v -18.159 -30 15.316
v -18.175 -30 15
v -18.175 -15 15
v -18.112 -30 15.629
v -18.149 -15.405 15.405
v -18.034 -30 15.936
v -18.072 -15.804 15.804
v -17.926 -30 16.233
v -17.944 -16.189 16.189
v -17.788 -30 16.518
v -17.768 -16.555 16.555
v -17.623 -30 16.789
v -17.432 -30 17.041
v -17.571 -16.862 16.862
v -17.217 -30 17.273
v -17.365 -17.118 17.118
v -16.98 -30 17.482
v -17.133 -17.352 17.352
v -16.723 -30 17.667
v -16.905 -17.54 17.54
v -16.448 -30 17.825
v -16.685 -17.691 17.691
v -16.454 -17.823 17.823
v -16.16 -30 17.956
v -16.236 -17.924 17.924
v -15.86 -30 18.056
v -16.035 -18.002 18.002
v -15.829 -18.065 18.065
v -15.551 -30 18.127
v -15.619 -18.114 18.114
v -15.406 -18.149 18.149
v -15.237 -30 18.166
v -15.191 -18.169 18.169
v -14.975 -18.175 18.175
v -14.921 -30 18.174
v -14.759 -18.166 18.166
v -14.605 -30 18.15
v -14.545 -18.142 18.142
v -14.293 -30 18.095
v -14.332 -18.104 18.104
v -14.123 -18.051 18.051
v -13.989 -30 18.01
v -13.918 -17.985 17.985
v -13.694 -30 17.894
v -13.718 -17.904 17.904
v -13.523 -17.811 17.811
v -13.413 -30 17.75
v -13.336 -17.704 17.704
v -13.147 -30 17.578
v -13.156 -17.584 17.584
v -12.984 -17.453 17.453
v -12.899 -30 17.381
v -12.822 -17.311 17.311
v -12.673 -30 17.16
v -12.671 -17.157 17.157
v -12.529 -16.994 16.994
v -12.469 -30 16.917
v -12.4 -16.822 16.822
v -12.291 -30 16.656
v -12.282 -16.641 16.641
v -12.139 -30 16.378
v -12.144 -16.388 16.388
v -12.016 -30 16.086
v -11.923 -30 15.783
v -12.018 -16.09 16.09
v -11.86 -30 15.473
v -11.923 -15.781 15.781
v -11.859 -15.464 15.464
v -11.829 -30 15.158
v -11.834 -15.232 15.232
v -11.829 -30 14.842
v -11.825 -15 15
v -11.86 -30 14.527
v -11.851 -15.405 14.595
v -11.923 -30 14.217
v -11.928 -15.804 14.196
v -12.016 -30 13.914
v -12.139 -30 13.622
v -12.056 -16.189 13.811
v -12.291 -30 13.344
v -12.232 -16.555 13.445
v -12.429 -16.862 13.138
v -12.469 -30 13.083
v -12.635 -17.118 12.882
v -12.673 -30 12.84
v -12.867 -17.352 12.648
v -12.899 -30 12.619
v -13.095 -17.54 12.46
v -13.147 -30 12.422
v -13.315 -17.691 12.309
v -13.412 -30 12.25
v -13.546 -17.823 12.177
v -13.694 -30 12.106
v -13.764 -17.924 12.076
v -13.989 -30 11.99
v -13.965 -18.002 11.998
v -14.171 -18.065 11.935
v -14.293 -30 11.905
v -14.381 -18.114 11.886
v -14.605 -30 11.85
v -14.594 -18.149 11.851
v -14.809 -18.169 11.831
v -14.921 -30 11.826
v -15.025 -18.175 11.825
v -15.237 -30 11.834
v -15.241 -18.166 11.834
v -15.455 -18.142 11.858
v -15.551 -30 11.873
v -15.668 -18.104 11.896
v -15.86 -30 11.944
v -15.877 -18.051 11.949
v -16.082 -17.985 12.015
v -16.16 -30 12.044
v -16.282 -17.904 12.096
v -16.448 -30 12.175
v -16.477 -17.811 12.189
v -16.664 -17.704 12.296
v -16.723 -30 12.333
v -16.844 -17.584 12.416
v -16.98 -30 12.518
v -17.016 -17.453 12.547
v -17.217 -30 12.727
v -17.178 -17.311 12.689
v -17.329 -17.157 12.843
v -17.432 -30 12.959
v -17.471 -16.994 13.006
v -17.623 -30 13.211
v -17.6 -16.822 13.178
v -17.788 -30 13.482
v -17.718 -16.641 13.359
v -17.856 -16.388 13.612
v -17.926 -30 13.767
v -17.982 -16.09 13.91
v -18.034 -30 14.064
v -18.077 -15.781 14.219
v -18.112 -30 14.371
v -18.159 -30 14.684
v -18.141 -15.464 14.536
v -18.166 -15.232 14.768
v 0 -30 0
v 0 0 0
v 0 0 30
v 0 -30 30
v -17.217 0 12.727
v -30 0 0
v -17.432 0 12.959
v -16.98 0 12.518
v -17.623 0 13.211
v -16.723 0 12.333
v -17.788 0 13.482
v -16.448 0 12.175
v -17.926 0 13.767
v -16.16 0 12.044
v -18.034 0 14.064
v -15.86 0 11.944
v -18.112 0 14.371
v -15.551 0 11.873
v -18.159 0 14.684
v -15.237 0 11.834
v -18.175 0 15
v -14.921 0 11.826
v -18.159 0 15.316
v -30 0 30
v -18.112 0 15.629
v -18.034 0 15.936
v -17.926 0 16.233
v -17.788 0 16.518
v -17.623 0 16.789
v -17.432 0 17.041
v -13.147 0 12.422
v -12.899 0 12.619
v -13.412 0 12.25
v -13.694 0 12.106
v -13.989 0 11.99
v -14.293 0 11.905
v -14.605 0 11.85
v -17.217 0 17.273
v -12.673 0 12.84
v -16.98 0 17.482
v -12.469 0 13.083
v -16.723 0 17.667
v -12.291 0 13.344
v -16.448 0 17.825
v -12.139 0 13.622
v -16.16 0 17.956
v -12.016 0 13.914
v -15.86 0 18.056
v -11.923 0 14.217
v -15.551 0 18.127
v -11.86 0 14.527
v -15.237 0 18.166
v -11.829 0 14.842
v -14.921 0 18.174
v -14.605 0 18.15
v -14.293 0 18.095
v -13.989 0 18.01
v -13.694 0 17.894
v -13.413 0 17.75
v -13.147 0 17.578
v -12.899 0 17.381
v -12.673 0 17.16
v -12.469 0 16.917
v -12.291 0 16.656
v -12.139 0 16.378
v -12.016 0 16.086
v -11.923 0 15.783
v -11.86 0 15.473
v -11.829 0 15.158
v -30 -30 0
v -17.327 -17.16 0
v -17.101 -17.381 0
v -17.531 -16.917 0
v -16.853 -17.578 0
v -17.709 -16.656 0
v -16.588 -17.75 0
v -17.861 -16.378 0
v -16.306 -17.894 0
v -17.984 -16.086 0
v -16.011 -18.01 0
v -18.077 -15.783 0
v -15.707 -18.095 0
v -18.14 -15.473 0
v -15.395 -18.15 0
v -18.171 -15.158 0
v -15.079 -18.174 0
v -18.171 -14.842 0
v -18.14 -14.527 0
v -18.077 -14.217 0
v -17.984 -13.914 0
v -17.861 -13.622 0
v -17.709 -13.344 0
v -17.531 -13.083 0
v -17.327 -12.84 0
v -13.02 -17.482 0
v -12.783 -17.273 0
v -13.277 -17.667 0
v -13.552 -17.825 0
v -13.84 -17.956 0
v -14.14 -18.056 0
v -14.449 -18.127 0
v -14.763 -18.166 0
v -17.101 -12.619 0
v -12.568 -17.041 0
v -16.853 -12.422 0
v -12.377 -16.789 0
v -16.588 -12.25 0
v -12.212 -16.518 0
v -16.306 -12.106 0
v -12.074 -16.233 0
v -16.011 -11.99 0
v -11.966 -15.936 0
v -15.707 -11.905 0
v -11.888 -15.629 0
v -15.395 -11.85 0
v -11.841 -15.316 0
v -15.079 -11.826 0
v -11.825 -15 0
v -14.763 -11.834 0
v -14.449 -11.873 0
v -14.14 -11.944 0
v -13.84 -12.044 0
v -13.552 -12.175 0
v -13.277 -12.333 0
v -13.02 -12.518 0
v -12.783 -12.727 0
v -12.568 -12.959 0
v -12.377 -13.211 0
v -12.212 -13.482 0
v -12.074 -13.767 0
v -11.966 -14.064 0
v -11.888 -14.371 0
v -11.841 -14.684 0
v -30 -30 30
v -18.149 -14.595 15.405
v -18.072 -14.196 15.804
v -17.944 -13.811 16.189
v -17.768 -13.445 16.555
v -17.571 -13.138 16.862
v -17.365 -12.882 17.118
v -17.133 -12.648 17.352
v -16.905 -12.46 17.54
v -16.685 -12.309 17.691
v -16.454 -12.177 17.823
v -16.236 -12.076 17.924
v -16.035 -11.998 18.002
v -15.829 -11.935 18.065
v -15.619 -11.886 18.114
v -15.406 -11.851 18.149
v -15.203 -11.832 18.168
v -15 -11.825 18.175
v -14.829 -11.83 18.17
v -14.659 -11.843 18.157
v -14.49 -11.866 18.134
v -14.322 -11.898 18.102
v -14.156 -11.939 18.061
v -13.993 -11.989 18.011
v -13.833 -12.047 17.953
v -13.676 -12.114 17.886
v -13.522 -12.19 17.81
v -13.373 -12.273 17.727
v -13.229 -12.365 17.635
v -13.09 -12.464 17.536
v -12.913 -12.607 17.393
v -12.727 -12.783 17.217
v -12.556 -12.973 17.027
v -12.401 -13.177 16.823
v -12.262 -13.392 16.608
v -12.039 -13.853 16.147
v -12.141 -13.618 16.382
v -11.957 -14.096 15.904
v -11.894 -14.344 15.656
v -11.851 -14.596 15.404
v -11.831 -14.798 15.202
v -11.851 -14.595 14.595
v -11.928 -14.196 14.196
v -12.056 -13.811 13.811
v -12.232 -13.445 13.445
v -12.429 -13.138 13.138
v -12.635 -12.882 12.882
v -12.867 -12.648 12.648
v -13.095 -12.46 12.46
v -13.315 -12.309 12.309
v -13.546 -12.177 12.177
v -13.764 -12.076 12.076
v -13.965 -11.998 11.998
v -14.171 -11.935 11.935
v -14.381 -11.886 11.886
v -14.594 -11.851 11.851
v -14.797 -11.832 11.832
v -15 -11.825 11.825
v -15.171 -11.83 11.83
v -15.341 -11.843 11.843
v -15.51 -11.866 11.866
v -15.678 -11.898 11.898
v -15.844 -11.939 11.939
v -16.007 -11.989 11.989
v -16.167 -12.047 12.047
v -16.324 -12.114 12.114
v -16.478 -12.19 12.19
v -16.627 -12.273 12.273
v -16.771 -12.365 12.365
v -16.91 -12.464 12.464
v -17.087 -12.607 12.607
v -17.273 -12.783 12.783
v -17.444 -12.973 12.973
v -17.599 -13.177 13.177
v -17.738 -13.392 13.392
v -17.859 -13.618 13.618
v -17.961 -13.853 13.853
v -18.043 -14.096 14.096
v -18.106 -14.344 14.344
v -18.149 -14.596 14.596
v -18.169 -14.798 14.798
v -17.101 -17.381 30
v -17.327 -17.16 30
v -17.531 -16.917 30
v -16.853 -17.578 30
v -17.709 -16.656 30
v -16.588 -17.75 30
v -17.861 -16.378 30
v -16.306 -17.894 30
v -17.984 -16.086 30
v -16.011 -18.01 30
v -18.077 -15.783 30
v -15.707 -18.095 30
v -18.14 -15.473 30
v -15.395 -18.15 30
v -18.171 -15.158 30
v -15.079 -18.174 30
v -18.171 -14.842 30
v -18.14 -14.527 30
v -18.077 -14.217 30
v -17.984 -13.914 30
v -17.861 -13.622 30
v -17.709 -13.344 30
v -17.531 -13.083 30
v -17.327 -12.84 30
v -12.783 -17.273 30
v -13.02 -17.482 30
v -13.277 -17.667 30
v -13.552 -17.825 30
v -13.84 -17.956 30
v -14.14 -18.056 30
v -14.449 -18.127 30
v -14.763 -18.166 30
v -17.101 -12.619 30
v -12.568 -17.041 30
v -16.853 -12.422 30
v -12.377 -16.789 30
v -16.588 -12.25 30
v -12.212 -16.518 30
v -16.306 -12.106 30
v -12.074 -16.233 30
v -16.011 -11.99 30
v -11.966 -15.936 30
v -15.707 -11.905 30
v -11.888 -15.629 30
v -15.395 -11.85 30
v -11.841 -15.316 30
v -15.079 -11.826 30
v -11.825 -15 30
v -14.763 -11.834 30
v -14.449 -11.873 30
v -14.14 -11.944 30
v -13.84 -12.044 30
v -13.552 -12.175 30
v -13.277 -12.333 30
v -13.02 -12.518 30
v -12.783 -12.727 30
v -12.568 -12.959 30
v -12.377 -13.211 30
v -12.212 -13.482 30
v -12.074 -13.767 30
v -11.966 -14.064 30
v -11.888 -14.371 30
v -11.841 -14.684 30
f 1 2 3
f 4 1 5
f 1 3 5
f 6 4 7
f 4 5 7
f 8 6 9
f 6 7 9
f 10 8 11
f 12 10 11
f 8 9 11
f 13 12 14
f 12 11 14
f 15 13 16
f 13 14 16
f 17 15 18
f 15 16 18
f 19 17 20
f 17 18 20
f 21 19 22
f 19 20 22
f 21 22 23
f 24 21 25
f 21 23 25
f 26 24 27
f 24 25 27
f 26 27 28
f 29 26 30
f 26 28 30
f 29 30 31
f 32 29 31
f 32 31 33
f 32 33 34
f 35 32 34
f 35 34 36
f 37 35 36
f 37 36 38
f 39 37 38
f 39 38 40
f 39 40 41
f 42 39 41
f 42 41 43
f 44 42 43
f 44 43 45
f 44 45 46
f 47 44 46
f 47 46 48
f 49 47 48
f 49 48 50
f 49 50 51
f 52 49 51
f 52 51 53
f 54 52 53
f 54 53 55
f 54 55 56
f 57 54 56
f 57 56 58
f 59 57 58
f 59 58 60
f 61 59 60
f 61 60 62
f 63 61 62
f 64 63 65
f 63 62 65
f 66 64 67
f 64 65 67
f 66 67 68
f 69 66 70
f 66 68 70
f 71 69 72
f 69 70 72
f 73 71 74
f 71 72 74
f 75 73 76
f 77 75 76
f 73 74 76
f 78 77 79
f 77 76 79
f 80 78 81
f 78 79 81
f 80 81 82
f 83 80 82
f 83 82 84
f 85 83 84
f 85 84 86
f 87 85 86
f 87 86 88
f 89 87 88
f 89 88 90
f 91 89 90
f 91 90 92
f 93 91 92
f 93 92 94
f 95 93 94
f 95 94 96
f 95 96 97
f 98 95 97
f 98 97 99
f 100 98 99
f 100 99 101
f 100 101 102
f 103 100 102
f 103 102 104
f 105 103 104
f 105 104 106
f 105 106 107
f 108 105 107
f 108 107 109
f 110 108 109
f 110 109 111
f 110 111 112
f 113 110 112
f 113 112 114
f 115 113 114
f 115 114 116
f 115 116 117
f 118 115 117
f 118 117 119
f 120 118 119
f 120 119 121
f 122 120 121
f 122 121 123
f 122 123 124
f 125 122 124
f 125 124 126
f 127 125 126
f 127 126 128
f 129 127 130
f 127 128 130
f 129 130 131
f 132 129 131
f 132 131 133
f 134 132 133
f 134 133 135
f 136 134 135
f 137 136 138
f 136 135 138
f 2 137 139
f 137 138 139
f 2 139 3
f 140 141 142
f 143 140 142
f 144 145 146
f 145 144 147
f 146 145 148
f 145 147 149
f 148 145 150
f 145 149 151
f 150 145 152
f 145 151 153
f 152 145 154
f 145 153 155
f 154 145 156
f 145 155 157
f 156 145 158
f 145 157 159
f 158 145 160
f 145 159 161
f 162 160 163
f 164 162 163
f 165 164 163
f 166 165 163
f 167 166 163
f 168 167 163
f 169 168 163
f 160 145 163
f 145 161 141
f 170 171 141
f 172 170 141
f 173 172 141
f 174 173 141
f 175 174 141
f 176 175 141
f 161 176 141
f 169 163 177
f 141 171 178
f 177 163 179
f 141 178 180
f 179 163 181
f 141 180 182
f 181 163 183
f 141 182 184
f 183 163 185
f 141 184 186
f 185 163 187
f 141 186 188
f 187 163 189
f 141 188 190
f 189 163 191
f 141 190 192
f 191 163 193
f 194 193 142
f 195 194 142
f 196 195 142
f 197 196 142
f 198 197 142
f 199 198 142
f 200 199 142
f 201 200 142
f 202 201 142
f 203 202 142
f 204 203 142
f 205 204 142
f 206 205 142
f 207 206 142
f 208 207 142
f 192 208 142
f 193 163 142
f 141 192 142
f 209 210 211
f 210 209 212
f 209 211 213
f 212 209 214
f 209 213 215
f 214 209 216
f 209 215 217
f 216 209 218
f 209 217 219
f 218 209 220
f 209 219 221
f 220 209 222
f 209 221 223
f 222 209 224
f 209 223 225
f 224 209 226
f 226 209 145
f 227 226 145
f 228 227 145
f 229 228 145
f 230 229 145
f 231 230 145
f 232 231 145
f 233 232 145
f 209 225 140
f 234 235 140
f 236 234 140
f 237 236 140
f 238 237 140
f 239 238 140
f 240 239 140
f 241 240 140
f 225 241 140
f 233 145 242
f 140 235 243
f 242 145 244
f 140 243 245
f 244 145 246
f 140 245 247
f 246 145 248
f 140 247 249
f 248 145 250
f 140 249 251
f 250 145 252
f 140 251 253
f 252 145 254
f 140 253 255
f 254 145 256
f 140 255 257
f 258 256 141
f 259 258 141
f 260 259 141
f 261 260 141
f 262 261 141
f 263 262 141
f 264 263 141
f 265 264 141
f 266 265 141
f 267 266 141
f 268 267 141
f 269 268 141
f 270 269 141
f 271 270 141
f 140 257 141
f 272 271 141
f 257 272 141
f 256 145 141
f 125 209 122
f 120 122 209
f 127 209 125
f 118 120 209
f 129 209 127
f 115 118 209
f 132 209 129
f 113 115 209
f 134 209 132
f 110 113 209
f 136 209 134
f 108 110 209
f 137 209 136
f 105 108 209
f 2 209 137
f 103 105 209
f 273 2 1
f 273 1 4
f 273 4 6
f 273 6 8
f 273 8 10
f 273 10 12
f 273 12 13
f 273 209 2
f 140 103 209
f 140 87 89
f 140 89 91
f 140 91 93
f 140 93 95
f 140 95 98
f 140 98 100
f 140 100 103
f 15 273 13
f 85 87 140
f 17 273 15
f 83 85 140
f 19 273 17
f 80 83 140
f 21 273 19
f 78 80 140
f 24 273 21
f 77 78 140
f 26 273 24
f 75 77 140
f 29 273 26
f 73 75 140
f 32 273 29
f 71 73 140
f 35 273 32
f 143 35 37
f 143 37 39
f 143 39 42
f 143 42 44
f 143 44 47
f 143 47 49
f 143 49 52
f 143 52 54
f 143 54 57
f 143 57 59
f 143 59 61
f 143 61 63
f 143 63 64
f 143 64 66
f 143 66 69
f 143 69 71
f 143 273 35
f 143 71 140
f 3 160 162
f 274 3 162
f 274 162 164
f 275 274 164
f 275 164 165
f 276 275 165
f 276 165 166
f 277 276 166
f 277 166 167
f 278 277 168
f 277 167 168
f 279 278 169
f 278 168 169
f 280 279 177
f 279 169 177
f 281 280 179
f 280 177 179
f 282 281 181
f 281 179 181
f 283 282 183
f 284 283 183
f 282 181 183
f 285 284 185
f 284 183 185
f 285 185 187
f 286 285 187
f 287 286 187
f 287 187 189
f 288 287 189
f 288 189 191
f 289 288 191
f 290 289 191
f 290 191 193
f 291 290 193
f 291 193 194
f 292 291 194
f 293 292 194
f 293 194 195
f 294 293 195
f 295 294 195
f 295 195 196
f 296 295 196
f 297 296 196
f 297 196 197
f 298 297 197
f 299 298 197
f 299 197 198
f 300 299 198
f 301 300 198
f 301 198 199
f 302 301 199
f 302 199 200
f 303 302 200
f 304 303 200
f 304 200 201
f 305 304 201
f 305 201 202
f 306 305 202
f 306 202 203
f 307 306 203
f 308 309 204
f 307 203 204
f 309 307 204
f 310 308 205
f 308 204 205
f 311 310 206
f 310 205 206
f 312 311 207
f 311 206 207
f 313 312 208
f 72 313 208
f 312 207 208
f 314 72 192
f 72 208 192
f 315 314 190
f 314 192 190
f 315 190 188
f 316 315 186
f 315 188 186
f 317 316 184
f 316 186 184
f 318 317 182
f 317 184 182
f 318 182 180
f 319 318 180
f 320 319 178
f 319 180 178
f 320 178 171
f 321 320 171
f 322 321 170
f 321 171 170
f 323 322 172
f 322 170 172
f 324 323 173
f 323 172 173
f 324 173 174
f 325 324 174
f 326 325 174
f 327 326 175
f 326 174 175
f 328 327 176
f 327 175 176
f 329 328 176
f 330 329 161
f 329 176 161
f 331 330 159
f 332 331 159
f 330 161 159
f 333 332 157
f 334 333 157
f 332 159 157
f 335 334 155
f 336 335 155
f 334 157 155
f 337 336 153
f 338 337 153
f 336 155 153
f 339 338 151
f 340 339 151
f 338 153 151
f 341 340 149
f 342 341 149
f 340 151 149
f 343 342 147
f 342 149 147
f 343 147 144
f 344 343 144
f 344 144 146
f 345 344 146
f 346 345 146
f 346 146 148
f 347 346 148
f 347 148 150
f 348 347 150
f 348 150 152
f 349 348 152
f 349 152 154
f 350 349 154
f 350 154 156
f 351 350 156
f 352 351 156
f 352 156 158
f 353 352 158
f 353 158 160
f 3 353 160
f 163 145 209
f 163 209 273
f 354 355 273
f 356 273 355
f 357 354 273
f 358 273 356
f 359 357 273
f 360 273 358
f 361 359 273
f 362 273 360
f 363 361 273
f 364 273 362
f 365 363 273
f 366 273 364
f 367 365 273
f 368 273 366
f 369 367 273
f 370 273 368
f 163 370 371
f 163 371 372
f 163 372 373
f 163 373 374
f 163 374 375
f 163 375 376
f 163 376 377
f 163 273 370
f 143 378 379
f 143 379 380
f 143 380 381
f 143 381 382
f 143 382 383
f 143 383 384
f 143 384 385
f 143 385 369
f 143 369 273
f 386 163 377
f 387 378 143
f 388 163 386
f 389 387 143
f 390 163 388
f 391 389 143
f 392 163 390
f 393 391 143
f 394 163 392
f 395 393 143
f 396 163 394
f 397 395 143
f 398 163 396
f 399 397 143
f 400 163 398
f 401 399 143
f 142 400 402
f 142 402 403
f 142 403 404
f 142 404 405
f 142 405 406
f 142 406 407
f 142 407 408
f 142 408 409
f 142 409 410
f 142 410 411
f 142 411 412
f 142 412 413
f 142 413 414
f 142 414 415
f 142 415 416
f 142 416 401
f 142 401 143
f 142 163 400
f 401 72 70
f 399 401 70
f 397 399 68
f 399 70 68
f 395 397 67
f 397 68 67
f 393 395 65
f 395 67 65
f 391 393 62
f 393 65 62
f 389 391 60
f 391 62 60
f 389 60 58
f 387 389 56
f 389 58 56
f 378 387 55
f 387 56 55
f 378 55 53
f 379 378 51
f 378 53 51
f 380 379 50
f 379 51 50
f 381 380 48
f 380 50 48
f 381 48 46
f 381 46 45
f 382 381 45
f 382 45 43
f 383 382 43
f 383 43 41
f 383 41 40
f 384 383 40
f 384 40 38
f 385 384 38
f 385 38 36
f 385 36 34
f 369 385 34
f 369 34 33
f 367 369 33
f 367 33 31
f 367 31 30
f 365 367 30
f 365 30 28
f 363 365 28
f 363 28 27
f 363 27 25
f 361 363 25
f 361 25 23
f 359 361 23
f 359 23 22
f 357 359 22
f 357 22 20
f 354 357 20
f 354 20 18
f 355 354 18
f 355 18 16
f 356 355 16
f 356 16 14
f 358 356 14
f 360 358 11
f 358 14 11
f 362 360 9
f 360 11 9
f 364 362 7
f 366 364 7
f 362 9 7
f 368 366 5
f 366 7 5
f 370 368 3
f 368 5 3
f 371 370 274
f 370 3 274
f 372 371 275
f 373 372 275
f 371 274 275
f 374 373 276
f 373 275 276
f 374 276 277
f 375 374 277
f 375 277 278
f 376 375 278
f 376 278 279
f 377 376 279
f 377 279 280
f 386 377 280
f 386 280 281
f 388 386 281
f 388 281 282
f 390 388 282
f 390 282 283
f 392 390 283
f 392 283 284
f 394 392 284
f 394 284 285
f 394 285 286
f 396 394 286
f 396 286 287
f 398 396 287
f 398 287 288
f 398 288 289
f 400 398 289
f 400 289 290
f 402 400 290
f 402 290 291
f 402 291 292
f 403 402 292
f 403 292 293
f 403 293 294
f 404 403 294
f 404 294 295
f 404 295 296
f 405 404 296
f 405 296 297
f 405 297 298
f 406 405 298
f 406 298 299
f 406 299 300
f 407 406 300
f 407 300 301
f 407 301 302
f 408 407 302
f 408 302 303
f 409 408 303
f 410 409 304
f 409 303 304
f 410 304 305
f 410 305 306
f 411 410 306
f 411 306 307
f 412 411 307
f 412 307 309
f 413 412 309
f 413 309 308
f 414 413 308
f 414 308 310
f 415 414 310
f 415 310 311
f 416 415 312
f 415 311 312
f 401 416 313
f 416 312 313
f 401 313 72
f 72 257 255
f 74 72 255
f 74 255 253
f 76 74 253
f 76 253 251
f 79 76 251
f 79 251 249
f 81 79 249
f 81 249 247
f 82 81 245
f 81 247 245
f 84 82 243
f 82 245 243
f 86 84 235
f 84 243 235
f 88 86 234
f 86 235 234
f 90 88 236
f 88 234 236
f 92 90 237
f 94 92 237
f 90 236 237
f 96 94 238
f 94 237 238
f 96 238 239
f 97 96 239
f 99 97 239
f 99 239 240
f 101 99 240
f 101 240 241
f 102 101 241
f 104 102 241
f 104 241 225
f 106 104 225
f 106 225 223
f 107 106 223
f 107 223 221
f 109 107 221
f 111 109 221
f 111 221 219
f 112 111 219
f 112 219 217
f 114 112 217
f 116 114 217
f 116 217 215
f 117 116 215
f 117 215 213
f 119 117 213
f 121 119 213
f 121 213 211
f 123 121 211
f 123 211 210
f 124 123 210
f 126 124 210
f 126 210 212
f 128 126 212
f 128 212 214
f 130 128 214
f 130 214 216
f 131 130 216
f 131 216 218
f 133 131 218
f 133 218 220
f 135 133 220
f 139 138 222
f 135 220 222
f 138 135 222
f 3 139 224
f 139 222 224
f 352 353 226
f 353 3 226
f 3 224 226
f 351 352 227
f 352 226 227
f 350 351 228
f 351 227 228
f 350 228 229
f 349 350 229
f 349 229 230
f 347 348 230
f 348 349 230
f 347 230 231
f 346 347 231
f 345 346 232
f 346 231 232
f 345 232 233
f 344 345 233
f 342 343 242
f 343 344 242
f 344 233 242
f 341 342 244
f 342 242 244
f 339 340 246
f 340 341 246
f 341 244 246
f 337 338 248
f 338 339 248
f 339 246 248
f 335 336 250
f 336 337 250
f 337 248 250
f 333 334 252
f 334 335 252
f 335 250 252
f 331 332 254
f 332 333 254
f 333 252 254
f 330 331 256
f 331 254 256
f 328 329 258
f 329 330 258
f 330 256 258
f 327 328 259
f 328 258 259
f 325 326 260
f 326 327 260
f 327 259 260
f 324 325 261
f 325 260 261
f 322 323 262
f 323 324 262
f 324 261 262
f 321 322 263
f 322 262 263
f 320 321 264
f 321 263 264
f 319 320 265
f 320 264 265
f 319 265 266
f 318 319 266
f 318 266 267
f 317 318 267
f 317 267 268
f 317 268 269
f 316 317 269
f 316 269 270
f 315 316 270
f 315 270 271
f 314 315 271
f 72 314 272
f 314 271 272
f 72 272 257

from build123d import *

# Parameters (mm, degrees)
F0_W     = 30
F0_H     = 30
F1_DEPTH = 30
F2_R     = 3.175
F3_DEPTH = 30.001
F4_R     = 3.175
F5_DEPTH = 30.001


with BuildPart() as f1:
    # F0 (on Front) → F1 (new body)
    with BuildSketch(Plane.XZ):
        with Locations((-15, 15)):
            Rectangle(F0_W, F0_H)
    extrude(amount=F1_DEPTH)

    # F2 (on face) → F3 (cut, through all)
    with BuildSketch(Plane(origin=(0, 0, 0), x_dir=(-1, 0, 0), z_dir=(0, 1, 0))):
        with Locations((15, 15)):
            Circle(F2_R)
    extrude(amount=-F3_DEPTH, mode=Mode.SUBTRACT)

    # F4 (on face) → F5 (cut, through all)
    with BuildSketch(Plane(origin=(0, 0, 0), x_dir=(1, 0, 0), z_dir=(0, 0, -1))):
        with Locations((-15, 15)):
            Circle(F4_R)
    extrude(amount=-F5_DEPTH, mode=Mode.SUBTRACT)


solid = f1.part
